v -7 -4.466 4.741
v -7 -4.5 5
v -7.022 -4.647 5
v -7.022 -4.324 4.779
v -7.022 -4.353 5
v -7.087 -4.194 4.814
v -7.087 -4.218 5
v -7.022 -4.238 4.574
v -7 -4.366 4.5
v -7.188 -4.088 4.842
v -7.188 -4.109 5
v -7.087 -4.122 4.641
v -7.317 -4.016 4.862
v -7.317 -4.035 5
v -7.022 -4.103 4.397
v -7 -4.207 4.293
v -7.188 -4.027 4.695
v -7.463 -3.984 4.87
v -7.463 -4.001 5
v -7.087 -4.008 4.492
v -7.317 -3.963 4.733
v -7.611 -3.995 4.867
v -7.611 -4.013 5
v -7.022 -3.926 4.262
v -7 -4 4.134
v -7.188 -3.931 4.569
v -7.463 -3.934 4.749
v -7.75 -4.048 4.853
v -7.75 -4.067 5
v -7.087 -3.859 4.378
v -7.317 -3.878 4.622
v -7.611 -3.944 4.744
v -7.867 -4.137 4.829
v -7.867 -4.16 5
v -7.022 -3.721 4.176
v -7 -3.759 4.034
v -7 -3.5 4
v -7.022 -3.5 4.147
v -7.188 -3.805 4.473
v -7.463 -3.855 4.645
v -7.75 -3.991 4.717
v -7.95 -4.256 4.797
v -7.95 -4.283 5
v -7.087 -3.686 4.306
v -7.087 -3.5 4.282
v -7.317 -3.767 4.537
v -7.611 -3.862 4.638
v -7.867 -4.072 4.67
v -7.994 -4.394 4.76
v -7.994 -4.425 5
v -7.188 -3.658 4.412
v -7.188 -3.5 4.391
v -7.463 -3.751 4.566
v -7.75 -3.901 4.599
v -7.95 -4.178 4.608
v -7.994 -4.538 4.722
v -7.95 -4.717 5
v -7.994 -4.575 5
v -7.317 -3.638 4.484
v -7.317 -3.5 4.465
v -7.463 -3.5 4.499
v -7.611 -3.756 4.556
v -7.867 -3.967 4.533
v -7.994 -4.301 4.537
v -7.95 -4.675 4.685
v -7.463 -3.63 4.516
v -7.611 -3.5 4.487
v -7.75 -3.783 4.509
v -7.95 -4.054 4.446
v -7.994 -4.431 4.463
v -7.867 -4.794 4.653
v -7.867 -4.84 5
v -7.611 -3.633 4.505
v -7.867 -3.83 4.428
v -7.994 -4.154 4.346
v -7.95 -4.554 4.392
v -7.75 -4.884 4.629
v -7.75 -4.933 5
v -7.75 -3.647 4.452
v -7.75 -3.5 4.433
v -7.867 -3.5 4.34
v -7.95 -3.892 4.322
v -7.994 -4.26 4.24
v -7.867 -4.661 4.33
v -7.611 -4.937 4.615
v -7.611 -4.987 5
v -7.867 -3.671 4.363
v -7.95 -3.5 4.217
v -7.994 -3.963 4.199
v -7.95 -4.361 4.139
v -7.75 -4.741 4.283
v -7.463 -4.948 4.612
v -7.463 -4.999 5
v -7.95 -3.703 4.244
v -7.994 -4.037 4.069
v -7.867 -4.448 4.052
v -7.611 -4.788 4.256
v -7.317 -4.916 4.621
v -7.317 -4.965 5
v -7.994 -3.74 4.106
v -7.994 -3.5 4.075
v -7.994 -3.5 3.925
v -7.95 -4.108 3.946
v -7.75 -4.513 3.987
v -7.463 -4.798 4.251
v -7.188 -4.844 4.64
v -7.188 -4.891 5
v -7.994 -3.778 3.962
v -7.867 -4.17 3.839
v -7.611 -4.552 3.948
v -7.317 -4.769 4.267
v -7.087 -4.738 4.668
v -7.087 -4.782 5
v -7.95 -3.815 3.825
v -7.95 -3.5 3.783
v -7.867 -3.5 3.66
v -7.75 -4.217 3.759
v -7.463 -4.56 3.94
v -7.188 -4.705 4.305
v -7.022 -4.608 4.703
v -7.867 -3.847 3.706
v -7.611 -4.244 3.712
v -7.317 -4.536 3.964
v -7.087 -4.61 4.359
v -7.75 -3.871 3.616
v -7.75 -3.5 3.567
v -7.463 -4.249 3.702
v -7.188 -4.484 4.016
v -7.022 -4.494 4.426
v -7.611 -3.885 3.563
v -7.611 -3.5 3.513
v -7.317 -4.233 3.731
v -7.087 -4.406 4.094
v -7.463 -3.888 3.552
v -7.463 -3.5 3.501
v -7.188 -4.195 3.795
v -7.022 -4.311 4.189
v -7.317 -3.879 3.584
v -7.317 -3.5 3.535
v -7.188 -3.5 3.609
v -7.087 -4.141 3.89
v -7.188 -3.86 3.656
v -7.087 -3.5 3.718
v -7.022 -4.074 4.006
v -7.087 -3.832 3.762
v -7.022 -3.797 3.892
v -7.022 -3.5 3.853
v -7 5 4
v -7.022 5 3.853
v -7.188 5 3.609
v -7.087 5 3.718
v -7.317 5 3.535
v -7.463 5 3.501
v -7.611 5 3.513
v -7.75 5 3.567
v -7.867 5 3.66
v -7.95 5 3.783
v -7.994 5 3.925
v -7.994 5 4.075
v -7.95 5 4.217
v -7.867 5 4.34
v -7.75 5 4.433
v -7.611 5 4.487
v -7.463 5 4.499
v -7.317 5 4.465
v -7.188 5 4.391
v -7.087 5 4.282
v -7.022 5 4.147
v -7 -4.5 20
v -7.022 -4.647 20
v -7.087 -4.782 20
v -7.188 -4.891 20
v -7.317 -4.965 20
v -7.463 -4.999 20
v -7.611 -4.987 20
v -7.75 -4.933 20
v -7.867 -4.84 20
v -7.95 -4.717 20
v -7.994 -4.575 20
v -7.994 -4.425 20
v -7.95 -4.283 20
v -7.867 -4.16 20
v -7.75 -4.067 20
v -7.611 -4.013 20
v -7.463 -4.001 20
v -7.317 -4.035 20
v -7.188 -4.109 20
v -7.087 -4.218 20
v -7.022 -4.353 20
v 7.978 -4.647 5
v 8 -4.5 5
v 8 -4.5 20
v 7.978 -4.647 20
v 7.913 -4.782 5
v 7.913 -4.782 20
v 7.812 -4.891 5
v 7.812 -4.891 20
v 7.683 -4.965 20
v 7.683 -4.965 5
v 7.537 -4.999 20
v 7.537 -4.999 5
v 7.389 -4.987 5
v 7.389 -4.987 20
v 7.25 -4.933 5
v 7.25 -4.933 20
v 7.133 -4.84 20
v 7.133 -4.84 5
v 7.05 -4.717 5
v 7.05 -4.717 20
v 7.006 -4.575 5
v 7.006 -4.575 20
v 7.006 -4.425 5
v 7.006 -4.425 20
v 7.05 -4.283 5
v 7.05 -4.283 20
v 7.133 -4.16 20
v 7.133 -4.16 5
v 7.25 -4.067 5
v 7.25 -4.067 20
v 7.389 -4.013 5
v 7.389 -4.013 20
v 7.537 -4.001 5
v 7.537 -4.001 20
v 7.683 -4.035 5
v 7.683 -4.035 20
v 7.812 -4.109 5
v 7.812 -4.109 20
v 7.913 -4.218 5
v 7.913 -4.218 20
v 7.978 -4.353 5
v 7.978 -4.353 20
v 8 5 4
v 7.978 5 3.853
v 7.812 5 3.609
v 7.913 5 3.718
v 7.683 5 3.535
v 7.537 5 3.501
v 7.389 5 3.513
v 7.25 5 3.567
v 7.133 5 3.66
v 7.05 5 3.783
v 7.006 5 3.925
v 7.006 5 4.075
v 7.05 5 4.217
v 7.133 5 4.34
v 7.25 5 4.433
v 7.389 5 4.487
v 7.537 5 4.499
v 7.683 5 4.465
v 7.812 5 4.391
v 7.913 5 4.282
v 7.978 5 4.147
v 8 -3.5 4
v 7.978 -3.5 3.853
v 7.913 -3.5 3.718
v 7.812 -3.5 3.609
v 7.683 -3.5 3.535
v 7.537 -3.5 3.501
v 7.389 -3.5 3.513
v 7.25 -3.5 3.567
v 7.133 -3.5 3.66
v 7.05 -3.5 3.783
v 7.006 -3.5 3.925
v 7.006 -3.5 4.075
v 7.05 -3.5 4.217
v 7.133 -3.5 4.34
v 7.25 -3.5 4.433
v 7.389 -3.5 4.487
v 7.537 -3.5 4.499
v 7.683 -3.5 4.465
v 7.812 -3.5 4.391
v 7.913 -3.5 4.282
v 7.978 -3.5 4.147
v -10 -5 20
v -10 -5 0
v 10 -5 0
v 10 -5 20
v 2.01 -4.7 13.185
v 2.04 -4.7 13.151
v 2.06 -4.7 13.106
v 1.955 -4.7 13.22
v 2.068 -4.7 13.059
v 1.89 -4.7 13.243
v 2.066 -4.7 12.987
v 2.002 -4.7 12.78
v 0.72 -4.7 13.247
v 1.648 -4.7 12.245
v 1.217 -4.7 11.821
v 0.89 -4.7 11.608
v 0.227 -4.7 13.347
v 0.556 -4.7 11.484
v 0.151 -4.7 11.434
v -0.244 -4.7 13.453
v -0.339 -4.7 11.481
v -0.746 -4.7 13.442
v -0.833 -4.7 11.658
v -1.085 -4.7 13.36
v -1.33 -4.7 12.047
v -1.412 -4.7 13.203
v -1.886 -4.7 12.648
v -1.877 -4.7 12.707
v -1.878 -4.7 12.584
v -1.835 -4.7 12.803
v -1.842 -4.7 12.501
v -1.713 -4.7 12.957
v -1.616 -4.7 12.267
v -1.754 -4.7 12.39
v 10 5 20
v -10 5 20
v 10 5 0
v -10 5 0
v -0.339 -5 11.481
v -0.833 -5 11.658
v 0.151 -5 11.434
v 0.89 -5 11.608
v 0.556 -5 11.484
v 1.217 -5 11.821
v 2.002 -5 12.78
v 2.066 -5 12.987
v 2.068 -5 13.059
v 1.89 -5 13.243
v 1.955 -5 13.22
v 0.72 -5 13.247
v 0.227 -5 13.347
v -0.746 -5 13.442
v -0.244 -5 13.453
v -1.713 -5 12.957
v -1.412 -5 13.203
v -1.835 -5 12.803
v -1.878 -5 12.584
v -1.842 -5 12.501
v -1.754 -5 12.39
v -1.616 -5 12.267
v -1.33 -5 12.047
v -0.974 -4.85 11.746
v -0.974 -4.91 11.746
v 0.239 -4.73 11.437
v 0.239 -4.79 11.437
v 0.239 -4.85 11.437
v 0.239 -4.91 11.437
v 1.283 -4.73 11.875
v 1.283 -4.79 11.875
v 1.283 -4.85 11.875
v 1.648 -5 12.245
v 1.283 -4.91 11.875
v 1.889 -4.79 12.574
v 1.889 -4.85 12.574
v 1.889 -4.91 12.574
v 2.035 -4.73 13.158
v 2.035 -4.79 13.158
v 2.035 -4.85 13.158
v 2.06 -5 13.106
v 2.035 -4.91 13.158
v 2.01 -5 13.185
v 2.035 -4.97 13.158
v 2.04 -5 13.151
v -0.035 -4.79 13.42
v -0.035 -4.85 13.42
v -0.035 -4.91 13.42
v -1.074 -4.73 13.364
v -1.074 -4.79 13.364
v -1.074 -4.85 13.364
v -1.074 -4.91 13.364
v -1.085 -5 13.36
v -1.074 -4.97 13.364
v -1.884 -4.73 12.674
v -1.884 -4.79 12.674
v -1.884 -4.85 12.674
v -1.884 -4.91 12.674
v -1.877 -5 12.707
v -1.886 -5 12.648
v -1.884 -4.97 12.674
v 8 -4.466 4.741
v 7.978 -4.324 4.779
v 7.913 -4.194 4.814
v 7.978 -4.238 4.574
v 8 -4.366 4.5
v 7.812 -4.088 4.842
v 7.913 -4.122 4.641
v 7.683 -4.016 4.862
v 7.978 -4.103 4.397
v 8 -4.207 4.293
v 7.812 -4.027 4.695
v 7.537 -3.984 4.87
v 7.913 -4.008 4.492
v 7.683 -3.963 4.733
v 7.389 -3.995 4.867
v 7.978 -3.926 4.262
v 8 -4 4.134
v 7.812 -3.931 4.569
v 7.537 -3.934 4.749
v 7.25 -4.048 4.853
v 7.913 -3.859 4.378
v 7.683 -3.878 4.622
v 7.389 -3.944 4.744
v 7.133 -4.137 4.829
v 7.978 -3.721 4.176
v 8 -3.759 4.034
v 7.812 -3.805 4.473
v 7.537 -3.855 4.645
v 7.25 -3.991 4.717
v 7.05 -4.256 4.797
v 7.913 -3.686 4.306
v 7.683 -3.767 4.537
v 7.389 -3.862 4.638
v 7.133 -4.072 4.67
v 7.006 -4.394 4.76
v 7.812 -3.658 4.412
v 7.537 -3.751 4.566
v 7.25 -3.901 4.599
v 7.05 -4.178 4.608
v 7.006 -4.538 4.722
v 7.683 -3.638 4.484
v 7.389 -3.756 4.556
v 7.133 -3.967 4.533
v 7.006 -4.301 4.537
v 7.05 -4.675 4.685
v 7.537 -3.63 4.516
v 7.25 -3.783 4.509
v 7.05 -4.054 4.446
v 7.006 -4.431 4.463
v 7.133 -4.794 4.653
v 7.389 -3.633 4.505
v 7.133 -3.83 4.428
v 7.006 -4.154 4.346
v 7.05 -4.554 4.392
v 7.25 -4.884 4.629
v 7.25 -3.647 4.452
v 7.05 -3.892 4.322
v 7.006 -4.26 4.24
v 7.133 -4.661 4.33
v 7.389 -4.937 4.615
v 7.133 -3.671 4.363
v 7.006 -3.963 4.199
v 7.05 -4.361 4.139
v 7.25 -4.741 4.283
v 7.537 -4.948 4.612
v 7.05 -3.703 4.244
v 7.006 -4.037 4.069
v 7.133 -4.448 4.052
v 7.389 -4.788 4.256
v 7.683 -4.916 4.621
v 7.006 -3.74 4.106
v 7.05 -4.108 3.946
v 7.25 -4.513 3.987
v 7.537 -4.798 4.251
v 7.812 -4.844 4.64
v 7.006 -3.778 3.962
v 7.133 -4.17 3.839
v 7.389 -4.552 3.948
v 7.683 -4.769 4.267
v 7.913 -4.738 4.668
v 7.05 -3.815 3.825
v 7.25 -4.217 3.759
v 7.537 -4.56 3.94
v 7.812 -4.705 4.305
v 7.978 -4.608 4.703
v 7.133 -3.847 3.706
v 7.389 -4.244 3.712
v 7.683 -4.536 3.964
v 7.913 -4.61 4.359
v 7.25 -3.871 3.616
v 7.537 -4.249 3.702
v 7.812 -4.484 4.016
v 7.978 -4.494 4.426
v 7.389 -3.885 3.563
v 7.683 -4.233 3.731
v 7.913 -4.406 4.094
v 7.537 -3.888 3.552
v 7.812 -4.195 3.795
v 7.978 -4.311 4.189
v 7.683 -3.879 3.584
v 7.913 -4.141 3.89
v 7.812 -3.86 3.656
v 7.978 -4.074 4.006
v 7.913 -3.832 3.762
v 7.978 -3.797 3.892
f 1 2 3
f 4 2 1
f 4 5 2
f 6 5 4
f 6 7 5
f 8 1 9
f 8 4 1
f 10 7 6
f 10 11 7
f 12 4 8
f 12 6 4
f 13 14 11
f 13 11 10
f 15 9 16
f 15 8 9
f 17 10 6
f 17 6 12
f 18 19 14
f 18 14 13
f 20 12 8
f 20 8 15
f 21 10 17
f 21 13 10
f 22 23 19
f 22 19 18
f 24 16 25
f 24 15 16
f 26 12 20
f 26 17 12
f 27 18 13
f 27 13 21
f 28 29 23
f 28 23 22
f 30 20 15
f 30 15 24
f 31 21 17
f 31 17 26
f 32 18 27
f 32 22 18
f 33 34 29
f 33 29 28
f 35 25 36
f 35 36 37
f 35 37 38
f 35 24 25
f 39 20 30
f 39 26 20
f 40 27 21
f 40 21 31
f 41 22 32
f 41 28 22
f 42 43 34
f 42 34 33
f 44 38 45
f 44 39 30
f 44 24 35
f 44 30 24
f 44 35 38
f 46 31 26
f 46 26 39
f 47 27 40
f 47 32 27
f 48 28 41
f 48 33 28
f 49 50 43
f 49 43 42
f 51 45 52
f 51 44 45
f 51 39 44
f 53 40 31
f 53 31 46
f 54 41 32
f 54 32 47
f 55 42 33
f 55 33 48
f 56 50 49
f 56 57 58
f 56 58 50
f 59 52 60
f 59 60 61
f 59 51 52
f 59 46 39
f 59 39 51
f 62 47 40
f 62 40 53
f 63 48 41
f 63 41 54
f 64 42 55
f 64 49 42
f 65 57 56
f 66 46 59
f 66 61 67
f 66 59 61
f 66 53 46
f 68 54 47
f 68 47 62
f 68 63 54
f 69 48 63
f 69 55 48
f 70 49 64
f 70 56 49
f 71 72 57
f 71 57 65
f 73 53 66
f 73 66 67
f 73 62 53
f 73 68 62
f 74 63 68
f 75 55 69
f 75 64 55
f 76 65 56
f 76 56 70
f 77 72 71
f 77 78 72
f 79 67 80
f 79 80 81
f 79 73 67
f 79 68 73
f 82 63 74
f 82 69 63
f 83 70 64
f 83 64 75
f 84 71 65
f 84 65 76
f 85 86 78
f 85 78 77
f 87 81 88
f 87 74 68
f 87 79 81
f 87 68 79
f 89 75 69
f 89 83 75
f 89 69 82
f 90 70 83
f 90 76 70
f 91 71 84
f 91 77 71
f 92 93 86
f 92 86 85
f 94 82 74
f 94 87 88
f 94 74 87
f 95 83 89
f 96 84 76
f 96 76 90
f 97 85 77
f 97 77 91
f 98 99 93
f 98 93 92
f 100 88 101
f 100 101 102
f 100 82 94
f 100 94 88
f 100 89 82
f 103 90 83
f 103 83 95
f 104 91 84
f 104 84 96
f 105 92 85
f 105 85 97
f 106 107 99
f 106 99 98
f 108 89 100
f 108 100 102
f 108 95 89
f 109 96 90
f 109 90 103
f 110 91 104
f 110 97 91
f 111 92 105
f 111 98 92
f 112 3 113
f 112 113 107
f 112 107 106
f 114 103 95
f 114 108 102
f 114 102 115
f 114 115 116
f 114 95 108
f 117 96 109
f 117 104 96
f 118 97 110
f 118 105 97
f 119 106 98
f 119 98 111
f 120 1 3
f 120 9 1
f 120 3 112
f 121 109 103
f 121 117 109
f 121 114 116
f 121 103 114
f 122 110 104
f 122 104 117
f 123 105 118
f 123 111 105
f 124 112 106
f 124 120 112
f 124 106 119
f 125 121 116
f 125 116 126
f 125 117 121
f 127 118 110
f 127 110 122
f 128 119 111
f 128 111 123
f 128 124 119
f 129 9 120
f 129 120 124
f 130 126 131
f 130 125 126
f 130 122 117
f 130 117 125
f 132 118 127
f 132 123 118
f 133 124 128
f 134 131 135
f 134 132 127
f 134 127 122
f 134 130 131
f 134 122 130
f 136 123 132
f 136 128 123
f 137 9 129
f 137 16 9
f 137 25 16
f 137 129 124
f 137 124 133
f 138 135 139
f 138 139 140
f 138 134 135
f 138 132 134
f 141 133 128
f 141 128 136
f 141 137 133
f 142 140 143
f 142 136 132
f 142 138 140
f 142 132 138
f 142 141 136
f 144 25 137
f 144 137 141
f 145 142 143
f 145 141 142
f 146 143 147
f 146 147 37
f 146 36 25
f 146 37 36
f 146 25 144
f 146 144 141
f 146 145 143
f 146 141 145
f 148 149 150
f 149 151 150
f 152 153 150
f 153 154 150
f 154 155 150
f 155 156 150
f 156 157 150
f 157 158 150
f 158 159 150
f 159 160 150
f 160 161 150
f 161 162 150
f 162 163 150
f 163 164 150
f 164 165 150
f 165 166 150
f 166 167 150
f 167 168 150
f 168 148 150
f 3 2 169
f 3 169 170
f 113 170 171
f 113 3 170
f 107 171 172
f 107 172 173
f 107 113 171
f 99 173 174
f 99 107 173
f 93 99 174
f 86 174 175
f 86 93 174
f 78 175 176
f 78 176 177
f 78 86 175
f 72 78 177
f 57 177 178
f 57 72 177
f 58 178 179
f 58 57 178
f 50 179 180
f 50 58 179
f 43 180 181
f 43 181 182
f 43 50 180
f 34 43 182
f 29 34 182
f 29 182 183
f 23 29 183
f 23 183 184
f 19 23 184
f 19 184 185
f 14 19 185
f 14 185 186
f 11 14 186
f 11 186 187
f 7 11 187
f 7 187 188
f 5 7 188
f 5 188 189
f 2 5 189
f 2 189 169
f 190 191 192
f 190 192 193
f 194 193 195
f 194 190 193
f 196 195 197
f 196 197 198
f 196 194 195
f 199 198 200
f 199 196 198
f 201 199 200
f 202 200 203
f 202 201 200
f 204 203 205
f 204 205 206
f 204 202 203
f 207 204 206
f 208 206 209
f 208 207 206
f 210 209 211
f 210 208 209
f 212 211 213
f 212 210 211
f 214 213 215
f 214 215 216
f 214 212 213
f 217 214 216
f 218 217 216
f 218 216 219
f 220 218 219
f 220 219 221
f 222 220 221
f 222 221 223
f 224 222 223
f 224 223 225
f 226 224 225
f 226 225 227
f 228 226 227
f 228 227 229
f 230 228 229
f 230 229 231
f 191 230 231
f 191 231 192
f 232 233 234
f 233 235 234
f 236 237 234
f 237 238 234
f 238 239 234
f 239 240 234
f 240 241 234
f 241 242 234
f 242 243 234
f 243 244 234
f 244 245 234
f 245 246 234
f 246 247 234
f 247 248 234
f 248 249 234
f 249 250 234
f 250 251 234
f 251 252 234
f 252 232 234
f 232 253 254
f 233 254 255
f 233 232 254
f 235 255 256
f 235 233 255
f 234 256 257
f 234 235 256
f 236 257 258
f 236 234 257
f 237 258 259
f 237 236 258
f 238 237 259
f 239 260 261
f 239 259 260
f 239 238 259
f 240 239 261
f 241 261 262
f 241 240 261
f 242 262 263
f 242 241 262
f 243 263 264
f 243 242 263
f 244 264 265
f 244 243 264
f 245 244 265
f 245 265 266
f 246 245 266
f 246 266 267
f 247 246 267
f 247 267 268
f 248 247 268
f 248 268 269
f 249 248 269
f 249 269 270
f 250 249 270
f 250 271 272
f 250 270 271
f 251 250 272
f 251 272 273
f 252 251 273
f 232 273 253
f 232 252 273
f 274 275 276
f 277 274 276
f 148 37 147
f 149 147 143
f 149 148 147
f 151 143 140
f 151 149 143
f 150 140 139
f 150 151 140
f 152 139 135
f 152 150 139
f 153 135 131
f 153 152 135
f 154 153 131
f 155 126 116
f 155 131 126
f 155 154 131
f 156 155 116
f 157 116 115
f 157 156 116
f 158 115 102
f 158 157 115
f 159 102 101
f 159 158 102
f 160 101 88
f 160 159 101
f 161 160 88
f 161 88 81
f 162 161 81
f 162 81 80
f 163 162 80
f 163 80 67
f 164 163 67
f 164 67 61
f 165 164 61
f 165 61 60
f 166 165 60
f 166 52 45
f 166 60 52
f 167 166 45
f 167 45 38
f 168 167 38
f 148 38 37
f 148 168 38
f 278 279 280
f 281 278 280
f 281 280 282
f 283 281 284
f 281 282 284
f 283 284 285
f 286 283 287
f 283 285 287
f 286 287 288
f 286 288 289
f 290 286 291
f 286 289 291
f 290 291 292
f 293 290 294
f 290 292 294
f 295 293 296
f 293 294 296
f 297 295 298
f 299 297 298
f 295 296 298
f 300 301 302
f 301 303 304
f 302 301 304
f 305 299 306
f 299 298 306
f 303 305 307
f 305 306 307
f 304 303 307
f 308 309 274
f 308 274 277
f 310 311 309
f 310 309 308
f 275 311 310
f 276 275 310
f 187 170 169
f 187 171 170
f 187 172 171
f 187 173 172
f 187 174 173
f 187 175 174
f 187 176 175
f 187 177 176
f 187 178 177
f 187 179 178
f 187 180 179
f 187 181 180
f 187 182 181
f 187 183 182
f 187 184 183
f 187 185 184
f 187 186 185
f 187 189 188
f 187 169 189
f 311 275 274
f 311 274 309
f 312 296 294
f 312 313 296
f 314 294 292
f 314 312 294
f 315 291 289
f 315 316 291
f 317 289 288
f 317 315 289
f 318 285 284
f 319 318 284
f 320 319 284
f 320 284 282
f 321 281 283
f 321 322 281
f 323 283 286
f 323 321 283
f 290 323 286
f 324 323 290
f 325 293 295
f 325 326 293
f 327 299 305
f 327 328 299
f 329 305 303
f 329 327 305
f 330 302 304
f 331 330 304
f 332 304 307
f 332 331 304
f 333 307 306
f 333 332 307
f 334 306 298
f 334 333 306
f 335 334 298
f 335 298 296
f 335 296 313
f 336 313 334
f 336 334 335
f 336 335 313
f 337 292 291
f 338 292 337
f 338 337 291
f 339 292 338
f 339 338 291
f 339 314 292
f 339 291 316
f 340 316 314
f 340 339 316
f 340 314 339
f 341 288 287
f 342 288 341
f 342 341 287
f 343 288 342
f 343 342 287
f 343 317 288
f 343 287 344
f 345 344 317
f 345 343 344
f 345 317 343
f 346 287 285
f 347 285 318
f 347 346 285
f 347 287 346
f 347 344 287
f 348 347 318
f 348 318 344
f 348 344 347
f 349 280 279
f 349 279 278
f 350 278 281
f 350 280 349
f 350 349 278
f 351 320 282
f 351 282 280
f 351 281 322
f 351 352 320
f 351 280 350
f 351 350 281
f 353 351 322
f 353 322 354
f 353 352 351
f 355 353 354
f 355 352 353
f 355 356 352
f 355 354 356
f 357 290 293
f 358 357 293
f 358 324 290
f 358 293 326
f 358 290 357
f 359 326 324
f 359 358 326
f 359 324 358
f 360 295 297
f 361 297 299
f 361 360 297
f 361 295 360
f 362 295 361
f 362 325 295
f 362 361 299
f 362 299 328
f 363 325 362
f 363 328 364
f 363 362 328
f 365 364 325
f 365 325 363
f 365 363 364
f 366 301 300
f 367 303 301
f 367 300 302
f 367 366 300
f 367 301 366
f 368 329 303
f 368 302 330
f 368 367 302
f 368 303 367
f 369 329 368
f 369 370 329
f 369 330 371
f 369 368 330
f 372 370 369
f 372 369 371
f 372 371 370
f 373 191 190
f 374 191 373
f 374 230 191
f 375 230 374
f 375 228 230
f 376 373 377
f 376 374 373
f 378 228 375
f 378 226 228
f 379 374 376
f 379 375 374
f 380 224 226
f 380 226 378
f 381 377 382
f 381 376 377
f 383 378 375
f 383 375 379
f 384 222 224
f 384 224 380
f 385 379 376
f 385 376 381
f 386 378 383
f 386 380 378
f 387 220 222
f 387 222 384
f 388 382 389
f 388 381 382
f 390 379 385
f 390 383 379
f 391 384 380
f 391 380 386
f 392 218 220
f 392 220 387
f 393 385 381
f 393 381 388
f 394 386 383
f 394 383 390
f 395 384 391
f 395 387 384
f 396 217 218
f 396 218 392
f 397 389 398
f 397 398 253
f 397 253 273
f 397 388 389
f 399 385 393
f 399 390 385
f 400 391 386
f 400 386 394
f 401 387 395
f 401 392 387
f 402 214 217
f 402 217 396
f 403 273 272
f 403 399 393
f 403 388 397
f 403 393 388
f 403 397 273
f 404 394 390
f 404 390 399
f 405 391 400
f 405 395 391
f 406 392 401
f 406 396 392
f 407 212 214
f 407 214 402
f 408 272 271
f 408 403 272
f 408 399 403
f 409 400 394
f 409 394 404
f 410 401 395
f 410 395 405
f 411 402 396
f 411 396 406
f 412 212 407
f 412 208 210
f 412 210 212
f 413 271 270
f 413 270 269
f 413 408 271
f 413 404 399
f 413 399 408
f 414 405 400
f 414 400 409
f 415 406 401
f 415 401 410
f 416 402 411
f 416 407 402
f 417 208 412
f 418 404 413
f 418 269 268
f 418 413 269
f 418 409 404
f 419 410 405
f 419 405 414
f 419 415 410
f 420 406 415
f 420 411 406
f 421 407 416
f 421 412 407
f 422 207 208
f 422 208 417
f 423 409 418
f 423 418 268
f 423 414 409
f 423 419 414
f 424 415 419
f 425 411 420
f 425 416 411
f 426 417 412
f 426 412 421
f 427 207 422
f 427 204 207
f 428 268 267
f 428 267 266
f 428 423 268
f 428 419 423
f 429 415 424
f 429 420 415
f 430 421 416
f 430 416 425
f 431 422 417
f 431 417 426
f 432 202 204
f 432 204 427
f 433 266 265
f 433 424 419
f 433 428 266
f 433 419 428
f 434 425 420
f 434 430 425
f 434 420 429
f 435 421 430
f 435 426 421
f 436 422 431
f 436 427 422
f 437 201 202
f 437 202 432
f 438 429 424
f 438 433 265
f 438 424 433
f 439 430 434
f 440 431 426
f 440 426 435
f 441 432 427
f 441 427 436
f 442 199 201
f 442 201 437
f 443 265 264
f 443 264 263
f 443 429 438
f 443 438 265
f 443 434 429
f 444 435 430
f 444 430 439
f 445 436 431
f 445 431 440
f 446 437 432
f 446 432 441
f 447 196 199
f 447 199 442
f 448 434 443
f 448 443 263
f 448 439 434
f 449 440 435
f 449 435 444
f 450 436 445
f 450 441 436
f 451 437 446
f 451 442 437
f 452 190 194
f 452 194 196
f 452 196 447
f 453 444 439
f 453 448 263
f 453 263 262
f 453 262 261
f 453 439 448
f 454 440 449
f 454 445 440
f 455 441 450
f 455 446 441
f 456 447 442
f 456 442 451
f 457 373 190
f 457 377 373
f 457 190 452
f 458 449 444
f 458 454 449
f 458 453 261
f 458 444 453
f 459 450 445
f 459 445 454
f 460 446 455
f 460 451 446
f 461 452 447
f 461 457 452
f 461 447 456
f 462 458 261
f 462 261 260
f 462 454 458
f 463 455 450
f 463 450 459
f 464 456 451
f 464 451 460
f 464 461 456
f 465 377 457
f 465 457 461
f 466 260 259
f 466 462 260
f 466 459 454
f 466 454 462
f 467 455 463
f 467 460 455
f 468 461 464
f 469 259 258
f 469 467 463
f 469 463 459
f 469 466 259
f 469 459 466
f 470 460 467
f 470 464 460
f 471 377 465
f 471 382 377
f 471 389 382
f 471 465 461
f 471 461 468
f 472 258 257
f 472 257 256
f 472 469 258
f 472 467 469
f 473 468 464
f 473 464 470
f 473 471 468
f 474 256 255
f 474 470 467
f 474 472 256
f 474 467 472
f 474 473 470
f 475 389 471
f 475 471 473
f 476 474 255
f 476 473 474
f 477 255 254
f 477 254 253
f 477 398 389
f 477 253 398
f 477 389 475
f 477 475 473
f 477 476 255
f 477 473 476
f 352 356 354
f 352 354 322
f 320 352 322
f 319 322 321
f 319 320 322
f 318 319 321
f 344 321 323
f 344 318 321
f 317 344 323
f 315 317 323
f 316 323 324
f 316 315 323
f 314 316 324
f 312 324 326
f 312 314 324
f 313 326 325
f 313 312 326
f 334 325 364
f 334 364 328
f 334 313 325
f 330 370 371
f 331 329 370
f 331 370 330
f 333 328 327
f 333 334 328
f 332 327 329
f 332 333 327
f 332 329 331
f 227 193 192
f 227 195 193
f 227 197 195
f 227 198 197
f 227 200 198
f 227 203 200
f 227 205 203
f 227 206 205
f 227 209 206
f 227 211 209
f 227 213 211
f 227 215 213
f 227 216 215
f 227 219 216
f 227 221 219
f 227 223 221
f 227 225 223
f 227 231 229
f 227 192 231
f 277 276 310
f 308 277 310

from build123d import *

# Parameters (mm, degrees)
SKETCH1_W           = 20
SKETCH1_H           = 10
BOSS_EXTRUDE1_DEPTH = 20
SKETCH2_R           = 0.5
SLICE_2_DEPTH       = 0.3


with BuildPart() as part:
    # Sketch1 → Boss-Extrude1 (new body)
    with BuildSketch(Plane.XY):
        Rectangle(SKETCH1_W, SKETCH1_H)
    extrude(amount=BOSS_EXTRUDE1_DEPTH)


with BuildPart() as body_2:
    # ag/agcl electrodes: sweep along a path in Sketch3
    with BuildLine(Plane(origin=(7.5, 0, 0), x_dir=(0, 0, -1), z_dir=(1, 0, 0))) as ag_agcl_electrodes_path:
        Line((-20, -4.5), (-5, -4.5))
        ThreePointArc((-5, -4.5), (-4.292893219, -4.207106781), (-4, -3.5))
        Line((-4, -3.5), (-4, 5))
    # Sketch2 → ag/agcl electrodes (sweep)
    with BuildSketch(Plane.XY.offset(20)):
        with Locations((-7.5, -4.5)):
            Circle(SKETCH2_R)
        with Locations((7.5, -4.5)):
            Circle(SKETCH2_R)
    sweep(path=ag_agcl_electrodes_path.line)


with BuildPart() as body_3:
    # Sketch4 → slice 2 (new body)
    with BuildSketch(Plane(origin=(0, -5, 0), x_dir=(1, 0, 0), z_dir=(0, 1, 0))):
        with BuildLine():
            add(Edge.make_bspline(
                [(-1.329786825, -12.04709664), (-1.196342031, -11.939424685), (-0.824147777, -11.548957834), (0.251281573, -11.322574475), (1.372606671, -11.746573561), (2.652909809, -13.571837262), (0.780549472, -13.104467787), (-0.122057097, -13.506347246), (-0.994791107, -13.460960152), (-1.586432094, -13.116889112), (-2.086144249, -12.539169772), (-1.569499382, -12.240512354), (-1.329786825, -12.04709664)],
                knots=[0, 0, 0, 0, 0.049562645, 0.182817887, 0.303261475, 0.461561344, 0.613381106, 0.684437877, 0.79516613, 0.866564728, 0.910968514, 1, 1, 1, 1], degree=3))
        make_face()
    extrude(amount=SLICE_2_DEPTH)


solid = Compound([part.part, body_2.part, body_3.part])
